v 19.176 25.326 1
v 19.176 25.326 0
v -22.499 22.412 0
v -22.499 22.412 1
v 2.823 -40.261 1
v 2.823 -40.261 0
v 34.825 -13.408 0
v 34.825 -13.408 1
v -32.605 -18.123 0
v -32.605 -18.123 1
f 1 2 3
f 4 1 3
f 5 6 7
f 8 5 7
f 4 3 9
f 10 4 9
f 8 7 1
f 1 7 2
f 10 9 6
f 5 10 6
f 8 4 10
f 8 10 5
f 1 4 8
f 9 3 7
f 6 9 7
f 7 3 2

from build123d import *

# Parameters (mm, degrees)
F1_DEPTH = 1


with BuildPart() as f1:
    # F0 (on Top) → F1 (new body)
    with BuildSketch(Plane.XY):
        Polygon((19.1758844015, 25.326287722), (-22.4985656812, 22.4124055891), (-32.6054123978, -18.1227908238), (2.822662895, -40.2610378147), (34.8252642985, -13.4080304936), align=None)
        Polygon((-31.7215240873, -17.8355981024), (-21.9522926631, 21.6605252833), (18.6296113834, 24.5744074162), (33.941375988, -13.1208377722), (2.822662895, -39.3316626458), align=None, mode=Mode.SUBTRACT)
        Polygon((18.6296113834, 24.5744074162), (-21.9522926631, 21.6605252833), (-31.7215240873, -17.8355981024), (2.822662895, -39.3316626458), (33.941375988, -13.1208377722), align=None)
    extrude(amount=F1_DEPTH)


solid = f1.part
